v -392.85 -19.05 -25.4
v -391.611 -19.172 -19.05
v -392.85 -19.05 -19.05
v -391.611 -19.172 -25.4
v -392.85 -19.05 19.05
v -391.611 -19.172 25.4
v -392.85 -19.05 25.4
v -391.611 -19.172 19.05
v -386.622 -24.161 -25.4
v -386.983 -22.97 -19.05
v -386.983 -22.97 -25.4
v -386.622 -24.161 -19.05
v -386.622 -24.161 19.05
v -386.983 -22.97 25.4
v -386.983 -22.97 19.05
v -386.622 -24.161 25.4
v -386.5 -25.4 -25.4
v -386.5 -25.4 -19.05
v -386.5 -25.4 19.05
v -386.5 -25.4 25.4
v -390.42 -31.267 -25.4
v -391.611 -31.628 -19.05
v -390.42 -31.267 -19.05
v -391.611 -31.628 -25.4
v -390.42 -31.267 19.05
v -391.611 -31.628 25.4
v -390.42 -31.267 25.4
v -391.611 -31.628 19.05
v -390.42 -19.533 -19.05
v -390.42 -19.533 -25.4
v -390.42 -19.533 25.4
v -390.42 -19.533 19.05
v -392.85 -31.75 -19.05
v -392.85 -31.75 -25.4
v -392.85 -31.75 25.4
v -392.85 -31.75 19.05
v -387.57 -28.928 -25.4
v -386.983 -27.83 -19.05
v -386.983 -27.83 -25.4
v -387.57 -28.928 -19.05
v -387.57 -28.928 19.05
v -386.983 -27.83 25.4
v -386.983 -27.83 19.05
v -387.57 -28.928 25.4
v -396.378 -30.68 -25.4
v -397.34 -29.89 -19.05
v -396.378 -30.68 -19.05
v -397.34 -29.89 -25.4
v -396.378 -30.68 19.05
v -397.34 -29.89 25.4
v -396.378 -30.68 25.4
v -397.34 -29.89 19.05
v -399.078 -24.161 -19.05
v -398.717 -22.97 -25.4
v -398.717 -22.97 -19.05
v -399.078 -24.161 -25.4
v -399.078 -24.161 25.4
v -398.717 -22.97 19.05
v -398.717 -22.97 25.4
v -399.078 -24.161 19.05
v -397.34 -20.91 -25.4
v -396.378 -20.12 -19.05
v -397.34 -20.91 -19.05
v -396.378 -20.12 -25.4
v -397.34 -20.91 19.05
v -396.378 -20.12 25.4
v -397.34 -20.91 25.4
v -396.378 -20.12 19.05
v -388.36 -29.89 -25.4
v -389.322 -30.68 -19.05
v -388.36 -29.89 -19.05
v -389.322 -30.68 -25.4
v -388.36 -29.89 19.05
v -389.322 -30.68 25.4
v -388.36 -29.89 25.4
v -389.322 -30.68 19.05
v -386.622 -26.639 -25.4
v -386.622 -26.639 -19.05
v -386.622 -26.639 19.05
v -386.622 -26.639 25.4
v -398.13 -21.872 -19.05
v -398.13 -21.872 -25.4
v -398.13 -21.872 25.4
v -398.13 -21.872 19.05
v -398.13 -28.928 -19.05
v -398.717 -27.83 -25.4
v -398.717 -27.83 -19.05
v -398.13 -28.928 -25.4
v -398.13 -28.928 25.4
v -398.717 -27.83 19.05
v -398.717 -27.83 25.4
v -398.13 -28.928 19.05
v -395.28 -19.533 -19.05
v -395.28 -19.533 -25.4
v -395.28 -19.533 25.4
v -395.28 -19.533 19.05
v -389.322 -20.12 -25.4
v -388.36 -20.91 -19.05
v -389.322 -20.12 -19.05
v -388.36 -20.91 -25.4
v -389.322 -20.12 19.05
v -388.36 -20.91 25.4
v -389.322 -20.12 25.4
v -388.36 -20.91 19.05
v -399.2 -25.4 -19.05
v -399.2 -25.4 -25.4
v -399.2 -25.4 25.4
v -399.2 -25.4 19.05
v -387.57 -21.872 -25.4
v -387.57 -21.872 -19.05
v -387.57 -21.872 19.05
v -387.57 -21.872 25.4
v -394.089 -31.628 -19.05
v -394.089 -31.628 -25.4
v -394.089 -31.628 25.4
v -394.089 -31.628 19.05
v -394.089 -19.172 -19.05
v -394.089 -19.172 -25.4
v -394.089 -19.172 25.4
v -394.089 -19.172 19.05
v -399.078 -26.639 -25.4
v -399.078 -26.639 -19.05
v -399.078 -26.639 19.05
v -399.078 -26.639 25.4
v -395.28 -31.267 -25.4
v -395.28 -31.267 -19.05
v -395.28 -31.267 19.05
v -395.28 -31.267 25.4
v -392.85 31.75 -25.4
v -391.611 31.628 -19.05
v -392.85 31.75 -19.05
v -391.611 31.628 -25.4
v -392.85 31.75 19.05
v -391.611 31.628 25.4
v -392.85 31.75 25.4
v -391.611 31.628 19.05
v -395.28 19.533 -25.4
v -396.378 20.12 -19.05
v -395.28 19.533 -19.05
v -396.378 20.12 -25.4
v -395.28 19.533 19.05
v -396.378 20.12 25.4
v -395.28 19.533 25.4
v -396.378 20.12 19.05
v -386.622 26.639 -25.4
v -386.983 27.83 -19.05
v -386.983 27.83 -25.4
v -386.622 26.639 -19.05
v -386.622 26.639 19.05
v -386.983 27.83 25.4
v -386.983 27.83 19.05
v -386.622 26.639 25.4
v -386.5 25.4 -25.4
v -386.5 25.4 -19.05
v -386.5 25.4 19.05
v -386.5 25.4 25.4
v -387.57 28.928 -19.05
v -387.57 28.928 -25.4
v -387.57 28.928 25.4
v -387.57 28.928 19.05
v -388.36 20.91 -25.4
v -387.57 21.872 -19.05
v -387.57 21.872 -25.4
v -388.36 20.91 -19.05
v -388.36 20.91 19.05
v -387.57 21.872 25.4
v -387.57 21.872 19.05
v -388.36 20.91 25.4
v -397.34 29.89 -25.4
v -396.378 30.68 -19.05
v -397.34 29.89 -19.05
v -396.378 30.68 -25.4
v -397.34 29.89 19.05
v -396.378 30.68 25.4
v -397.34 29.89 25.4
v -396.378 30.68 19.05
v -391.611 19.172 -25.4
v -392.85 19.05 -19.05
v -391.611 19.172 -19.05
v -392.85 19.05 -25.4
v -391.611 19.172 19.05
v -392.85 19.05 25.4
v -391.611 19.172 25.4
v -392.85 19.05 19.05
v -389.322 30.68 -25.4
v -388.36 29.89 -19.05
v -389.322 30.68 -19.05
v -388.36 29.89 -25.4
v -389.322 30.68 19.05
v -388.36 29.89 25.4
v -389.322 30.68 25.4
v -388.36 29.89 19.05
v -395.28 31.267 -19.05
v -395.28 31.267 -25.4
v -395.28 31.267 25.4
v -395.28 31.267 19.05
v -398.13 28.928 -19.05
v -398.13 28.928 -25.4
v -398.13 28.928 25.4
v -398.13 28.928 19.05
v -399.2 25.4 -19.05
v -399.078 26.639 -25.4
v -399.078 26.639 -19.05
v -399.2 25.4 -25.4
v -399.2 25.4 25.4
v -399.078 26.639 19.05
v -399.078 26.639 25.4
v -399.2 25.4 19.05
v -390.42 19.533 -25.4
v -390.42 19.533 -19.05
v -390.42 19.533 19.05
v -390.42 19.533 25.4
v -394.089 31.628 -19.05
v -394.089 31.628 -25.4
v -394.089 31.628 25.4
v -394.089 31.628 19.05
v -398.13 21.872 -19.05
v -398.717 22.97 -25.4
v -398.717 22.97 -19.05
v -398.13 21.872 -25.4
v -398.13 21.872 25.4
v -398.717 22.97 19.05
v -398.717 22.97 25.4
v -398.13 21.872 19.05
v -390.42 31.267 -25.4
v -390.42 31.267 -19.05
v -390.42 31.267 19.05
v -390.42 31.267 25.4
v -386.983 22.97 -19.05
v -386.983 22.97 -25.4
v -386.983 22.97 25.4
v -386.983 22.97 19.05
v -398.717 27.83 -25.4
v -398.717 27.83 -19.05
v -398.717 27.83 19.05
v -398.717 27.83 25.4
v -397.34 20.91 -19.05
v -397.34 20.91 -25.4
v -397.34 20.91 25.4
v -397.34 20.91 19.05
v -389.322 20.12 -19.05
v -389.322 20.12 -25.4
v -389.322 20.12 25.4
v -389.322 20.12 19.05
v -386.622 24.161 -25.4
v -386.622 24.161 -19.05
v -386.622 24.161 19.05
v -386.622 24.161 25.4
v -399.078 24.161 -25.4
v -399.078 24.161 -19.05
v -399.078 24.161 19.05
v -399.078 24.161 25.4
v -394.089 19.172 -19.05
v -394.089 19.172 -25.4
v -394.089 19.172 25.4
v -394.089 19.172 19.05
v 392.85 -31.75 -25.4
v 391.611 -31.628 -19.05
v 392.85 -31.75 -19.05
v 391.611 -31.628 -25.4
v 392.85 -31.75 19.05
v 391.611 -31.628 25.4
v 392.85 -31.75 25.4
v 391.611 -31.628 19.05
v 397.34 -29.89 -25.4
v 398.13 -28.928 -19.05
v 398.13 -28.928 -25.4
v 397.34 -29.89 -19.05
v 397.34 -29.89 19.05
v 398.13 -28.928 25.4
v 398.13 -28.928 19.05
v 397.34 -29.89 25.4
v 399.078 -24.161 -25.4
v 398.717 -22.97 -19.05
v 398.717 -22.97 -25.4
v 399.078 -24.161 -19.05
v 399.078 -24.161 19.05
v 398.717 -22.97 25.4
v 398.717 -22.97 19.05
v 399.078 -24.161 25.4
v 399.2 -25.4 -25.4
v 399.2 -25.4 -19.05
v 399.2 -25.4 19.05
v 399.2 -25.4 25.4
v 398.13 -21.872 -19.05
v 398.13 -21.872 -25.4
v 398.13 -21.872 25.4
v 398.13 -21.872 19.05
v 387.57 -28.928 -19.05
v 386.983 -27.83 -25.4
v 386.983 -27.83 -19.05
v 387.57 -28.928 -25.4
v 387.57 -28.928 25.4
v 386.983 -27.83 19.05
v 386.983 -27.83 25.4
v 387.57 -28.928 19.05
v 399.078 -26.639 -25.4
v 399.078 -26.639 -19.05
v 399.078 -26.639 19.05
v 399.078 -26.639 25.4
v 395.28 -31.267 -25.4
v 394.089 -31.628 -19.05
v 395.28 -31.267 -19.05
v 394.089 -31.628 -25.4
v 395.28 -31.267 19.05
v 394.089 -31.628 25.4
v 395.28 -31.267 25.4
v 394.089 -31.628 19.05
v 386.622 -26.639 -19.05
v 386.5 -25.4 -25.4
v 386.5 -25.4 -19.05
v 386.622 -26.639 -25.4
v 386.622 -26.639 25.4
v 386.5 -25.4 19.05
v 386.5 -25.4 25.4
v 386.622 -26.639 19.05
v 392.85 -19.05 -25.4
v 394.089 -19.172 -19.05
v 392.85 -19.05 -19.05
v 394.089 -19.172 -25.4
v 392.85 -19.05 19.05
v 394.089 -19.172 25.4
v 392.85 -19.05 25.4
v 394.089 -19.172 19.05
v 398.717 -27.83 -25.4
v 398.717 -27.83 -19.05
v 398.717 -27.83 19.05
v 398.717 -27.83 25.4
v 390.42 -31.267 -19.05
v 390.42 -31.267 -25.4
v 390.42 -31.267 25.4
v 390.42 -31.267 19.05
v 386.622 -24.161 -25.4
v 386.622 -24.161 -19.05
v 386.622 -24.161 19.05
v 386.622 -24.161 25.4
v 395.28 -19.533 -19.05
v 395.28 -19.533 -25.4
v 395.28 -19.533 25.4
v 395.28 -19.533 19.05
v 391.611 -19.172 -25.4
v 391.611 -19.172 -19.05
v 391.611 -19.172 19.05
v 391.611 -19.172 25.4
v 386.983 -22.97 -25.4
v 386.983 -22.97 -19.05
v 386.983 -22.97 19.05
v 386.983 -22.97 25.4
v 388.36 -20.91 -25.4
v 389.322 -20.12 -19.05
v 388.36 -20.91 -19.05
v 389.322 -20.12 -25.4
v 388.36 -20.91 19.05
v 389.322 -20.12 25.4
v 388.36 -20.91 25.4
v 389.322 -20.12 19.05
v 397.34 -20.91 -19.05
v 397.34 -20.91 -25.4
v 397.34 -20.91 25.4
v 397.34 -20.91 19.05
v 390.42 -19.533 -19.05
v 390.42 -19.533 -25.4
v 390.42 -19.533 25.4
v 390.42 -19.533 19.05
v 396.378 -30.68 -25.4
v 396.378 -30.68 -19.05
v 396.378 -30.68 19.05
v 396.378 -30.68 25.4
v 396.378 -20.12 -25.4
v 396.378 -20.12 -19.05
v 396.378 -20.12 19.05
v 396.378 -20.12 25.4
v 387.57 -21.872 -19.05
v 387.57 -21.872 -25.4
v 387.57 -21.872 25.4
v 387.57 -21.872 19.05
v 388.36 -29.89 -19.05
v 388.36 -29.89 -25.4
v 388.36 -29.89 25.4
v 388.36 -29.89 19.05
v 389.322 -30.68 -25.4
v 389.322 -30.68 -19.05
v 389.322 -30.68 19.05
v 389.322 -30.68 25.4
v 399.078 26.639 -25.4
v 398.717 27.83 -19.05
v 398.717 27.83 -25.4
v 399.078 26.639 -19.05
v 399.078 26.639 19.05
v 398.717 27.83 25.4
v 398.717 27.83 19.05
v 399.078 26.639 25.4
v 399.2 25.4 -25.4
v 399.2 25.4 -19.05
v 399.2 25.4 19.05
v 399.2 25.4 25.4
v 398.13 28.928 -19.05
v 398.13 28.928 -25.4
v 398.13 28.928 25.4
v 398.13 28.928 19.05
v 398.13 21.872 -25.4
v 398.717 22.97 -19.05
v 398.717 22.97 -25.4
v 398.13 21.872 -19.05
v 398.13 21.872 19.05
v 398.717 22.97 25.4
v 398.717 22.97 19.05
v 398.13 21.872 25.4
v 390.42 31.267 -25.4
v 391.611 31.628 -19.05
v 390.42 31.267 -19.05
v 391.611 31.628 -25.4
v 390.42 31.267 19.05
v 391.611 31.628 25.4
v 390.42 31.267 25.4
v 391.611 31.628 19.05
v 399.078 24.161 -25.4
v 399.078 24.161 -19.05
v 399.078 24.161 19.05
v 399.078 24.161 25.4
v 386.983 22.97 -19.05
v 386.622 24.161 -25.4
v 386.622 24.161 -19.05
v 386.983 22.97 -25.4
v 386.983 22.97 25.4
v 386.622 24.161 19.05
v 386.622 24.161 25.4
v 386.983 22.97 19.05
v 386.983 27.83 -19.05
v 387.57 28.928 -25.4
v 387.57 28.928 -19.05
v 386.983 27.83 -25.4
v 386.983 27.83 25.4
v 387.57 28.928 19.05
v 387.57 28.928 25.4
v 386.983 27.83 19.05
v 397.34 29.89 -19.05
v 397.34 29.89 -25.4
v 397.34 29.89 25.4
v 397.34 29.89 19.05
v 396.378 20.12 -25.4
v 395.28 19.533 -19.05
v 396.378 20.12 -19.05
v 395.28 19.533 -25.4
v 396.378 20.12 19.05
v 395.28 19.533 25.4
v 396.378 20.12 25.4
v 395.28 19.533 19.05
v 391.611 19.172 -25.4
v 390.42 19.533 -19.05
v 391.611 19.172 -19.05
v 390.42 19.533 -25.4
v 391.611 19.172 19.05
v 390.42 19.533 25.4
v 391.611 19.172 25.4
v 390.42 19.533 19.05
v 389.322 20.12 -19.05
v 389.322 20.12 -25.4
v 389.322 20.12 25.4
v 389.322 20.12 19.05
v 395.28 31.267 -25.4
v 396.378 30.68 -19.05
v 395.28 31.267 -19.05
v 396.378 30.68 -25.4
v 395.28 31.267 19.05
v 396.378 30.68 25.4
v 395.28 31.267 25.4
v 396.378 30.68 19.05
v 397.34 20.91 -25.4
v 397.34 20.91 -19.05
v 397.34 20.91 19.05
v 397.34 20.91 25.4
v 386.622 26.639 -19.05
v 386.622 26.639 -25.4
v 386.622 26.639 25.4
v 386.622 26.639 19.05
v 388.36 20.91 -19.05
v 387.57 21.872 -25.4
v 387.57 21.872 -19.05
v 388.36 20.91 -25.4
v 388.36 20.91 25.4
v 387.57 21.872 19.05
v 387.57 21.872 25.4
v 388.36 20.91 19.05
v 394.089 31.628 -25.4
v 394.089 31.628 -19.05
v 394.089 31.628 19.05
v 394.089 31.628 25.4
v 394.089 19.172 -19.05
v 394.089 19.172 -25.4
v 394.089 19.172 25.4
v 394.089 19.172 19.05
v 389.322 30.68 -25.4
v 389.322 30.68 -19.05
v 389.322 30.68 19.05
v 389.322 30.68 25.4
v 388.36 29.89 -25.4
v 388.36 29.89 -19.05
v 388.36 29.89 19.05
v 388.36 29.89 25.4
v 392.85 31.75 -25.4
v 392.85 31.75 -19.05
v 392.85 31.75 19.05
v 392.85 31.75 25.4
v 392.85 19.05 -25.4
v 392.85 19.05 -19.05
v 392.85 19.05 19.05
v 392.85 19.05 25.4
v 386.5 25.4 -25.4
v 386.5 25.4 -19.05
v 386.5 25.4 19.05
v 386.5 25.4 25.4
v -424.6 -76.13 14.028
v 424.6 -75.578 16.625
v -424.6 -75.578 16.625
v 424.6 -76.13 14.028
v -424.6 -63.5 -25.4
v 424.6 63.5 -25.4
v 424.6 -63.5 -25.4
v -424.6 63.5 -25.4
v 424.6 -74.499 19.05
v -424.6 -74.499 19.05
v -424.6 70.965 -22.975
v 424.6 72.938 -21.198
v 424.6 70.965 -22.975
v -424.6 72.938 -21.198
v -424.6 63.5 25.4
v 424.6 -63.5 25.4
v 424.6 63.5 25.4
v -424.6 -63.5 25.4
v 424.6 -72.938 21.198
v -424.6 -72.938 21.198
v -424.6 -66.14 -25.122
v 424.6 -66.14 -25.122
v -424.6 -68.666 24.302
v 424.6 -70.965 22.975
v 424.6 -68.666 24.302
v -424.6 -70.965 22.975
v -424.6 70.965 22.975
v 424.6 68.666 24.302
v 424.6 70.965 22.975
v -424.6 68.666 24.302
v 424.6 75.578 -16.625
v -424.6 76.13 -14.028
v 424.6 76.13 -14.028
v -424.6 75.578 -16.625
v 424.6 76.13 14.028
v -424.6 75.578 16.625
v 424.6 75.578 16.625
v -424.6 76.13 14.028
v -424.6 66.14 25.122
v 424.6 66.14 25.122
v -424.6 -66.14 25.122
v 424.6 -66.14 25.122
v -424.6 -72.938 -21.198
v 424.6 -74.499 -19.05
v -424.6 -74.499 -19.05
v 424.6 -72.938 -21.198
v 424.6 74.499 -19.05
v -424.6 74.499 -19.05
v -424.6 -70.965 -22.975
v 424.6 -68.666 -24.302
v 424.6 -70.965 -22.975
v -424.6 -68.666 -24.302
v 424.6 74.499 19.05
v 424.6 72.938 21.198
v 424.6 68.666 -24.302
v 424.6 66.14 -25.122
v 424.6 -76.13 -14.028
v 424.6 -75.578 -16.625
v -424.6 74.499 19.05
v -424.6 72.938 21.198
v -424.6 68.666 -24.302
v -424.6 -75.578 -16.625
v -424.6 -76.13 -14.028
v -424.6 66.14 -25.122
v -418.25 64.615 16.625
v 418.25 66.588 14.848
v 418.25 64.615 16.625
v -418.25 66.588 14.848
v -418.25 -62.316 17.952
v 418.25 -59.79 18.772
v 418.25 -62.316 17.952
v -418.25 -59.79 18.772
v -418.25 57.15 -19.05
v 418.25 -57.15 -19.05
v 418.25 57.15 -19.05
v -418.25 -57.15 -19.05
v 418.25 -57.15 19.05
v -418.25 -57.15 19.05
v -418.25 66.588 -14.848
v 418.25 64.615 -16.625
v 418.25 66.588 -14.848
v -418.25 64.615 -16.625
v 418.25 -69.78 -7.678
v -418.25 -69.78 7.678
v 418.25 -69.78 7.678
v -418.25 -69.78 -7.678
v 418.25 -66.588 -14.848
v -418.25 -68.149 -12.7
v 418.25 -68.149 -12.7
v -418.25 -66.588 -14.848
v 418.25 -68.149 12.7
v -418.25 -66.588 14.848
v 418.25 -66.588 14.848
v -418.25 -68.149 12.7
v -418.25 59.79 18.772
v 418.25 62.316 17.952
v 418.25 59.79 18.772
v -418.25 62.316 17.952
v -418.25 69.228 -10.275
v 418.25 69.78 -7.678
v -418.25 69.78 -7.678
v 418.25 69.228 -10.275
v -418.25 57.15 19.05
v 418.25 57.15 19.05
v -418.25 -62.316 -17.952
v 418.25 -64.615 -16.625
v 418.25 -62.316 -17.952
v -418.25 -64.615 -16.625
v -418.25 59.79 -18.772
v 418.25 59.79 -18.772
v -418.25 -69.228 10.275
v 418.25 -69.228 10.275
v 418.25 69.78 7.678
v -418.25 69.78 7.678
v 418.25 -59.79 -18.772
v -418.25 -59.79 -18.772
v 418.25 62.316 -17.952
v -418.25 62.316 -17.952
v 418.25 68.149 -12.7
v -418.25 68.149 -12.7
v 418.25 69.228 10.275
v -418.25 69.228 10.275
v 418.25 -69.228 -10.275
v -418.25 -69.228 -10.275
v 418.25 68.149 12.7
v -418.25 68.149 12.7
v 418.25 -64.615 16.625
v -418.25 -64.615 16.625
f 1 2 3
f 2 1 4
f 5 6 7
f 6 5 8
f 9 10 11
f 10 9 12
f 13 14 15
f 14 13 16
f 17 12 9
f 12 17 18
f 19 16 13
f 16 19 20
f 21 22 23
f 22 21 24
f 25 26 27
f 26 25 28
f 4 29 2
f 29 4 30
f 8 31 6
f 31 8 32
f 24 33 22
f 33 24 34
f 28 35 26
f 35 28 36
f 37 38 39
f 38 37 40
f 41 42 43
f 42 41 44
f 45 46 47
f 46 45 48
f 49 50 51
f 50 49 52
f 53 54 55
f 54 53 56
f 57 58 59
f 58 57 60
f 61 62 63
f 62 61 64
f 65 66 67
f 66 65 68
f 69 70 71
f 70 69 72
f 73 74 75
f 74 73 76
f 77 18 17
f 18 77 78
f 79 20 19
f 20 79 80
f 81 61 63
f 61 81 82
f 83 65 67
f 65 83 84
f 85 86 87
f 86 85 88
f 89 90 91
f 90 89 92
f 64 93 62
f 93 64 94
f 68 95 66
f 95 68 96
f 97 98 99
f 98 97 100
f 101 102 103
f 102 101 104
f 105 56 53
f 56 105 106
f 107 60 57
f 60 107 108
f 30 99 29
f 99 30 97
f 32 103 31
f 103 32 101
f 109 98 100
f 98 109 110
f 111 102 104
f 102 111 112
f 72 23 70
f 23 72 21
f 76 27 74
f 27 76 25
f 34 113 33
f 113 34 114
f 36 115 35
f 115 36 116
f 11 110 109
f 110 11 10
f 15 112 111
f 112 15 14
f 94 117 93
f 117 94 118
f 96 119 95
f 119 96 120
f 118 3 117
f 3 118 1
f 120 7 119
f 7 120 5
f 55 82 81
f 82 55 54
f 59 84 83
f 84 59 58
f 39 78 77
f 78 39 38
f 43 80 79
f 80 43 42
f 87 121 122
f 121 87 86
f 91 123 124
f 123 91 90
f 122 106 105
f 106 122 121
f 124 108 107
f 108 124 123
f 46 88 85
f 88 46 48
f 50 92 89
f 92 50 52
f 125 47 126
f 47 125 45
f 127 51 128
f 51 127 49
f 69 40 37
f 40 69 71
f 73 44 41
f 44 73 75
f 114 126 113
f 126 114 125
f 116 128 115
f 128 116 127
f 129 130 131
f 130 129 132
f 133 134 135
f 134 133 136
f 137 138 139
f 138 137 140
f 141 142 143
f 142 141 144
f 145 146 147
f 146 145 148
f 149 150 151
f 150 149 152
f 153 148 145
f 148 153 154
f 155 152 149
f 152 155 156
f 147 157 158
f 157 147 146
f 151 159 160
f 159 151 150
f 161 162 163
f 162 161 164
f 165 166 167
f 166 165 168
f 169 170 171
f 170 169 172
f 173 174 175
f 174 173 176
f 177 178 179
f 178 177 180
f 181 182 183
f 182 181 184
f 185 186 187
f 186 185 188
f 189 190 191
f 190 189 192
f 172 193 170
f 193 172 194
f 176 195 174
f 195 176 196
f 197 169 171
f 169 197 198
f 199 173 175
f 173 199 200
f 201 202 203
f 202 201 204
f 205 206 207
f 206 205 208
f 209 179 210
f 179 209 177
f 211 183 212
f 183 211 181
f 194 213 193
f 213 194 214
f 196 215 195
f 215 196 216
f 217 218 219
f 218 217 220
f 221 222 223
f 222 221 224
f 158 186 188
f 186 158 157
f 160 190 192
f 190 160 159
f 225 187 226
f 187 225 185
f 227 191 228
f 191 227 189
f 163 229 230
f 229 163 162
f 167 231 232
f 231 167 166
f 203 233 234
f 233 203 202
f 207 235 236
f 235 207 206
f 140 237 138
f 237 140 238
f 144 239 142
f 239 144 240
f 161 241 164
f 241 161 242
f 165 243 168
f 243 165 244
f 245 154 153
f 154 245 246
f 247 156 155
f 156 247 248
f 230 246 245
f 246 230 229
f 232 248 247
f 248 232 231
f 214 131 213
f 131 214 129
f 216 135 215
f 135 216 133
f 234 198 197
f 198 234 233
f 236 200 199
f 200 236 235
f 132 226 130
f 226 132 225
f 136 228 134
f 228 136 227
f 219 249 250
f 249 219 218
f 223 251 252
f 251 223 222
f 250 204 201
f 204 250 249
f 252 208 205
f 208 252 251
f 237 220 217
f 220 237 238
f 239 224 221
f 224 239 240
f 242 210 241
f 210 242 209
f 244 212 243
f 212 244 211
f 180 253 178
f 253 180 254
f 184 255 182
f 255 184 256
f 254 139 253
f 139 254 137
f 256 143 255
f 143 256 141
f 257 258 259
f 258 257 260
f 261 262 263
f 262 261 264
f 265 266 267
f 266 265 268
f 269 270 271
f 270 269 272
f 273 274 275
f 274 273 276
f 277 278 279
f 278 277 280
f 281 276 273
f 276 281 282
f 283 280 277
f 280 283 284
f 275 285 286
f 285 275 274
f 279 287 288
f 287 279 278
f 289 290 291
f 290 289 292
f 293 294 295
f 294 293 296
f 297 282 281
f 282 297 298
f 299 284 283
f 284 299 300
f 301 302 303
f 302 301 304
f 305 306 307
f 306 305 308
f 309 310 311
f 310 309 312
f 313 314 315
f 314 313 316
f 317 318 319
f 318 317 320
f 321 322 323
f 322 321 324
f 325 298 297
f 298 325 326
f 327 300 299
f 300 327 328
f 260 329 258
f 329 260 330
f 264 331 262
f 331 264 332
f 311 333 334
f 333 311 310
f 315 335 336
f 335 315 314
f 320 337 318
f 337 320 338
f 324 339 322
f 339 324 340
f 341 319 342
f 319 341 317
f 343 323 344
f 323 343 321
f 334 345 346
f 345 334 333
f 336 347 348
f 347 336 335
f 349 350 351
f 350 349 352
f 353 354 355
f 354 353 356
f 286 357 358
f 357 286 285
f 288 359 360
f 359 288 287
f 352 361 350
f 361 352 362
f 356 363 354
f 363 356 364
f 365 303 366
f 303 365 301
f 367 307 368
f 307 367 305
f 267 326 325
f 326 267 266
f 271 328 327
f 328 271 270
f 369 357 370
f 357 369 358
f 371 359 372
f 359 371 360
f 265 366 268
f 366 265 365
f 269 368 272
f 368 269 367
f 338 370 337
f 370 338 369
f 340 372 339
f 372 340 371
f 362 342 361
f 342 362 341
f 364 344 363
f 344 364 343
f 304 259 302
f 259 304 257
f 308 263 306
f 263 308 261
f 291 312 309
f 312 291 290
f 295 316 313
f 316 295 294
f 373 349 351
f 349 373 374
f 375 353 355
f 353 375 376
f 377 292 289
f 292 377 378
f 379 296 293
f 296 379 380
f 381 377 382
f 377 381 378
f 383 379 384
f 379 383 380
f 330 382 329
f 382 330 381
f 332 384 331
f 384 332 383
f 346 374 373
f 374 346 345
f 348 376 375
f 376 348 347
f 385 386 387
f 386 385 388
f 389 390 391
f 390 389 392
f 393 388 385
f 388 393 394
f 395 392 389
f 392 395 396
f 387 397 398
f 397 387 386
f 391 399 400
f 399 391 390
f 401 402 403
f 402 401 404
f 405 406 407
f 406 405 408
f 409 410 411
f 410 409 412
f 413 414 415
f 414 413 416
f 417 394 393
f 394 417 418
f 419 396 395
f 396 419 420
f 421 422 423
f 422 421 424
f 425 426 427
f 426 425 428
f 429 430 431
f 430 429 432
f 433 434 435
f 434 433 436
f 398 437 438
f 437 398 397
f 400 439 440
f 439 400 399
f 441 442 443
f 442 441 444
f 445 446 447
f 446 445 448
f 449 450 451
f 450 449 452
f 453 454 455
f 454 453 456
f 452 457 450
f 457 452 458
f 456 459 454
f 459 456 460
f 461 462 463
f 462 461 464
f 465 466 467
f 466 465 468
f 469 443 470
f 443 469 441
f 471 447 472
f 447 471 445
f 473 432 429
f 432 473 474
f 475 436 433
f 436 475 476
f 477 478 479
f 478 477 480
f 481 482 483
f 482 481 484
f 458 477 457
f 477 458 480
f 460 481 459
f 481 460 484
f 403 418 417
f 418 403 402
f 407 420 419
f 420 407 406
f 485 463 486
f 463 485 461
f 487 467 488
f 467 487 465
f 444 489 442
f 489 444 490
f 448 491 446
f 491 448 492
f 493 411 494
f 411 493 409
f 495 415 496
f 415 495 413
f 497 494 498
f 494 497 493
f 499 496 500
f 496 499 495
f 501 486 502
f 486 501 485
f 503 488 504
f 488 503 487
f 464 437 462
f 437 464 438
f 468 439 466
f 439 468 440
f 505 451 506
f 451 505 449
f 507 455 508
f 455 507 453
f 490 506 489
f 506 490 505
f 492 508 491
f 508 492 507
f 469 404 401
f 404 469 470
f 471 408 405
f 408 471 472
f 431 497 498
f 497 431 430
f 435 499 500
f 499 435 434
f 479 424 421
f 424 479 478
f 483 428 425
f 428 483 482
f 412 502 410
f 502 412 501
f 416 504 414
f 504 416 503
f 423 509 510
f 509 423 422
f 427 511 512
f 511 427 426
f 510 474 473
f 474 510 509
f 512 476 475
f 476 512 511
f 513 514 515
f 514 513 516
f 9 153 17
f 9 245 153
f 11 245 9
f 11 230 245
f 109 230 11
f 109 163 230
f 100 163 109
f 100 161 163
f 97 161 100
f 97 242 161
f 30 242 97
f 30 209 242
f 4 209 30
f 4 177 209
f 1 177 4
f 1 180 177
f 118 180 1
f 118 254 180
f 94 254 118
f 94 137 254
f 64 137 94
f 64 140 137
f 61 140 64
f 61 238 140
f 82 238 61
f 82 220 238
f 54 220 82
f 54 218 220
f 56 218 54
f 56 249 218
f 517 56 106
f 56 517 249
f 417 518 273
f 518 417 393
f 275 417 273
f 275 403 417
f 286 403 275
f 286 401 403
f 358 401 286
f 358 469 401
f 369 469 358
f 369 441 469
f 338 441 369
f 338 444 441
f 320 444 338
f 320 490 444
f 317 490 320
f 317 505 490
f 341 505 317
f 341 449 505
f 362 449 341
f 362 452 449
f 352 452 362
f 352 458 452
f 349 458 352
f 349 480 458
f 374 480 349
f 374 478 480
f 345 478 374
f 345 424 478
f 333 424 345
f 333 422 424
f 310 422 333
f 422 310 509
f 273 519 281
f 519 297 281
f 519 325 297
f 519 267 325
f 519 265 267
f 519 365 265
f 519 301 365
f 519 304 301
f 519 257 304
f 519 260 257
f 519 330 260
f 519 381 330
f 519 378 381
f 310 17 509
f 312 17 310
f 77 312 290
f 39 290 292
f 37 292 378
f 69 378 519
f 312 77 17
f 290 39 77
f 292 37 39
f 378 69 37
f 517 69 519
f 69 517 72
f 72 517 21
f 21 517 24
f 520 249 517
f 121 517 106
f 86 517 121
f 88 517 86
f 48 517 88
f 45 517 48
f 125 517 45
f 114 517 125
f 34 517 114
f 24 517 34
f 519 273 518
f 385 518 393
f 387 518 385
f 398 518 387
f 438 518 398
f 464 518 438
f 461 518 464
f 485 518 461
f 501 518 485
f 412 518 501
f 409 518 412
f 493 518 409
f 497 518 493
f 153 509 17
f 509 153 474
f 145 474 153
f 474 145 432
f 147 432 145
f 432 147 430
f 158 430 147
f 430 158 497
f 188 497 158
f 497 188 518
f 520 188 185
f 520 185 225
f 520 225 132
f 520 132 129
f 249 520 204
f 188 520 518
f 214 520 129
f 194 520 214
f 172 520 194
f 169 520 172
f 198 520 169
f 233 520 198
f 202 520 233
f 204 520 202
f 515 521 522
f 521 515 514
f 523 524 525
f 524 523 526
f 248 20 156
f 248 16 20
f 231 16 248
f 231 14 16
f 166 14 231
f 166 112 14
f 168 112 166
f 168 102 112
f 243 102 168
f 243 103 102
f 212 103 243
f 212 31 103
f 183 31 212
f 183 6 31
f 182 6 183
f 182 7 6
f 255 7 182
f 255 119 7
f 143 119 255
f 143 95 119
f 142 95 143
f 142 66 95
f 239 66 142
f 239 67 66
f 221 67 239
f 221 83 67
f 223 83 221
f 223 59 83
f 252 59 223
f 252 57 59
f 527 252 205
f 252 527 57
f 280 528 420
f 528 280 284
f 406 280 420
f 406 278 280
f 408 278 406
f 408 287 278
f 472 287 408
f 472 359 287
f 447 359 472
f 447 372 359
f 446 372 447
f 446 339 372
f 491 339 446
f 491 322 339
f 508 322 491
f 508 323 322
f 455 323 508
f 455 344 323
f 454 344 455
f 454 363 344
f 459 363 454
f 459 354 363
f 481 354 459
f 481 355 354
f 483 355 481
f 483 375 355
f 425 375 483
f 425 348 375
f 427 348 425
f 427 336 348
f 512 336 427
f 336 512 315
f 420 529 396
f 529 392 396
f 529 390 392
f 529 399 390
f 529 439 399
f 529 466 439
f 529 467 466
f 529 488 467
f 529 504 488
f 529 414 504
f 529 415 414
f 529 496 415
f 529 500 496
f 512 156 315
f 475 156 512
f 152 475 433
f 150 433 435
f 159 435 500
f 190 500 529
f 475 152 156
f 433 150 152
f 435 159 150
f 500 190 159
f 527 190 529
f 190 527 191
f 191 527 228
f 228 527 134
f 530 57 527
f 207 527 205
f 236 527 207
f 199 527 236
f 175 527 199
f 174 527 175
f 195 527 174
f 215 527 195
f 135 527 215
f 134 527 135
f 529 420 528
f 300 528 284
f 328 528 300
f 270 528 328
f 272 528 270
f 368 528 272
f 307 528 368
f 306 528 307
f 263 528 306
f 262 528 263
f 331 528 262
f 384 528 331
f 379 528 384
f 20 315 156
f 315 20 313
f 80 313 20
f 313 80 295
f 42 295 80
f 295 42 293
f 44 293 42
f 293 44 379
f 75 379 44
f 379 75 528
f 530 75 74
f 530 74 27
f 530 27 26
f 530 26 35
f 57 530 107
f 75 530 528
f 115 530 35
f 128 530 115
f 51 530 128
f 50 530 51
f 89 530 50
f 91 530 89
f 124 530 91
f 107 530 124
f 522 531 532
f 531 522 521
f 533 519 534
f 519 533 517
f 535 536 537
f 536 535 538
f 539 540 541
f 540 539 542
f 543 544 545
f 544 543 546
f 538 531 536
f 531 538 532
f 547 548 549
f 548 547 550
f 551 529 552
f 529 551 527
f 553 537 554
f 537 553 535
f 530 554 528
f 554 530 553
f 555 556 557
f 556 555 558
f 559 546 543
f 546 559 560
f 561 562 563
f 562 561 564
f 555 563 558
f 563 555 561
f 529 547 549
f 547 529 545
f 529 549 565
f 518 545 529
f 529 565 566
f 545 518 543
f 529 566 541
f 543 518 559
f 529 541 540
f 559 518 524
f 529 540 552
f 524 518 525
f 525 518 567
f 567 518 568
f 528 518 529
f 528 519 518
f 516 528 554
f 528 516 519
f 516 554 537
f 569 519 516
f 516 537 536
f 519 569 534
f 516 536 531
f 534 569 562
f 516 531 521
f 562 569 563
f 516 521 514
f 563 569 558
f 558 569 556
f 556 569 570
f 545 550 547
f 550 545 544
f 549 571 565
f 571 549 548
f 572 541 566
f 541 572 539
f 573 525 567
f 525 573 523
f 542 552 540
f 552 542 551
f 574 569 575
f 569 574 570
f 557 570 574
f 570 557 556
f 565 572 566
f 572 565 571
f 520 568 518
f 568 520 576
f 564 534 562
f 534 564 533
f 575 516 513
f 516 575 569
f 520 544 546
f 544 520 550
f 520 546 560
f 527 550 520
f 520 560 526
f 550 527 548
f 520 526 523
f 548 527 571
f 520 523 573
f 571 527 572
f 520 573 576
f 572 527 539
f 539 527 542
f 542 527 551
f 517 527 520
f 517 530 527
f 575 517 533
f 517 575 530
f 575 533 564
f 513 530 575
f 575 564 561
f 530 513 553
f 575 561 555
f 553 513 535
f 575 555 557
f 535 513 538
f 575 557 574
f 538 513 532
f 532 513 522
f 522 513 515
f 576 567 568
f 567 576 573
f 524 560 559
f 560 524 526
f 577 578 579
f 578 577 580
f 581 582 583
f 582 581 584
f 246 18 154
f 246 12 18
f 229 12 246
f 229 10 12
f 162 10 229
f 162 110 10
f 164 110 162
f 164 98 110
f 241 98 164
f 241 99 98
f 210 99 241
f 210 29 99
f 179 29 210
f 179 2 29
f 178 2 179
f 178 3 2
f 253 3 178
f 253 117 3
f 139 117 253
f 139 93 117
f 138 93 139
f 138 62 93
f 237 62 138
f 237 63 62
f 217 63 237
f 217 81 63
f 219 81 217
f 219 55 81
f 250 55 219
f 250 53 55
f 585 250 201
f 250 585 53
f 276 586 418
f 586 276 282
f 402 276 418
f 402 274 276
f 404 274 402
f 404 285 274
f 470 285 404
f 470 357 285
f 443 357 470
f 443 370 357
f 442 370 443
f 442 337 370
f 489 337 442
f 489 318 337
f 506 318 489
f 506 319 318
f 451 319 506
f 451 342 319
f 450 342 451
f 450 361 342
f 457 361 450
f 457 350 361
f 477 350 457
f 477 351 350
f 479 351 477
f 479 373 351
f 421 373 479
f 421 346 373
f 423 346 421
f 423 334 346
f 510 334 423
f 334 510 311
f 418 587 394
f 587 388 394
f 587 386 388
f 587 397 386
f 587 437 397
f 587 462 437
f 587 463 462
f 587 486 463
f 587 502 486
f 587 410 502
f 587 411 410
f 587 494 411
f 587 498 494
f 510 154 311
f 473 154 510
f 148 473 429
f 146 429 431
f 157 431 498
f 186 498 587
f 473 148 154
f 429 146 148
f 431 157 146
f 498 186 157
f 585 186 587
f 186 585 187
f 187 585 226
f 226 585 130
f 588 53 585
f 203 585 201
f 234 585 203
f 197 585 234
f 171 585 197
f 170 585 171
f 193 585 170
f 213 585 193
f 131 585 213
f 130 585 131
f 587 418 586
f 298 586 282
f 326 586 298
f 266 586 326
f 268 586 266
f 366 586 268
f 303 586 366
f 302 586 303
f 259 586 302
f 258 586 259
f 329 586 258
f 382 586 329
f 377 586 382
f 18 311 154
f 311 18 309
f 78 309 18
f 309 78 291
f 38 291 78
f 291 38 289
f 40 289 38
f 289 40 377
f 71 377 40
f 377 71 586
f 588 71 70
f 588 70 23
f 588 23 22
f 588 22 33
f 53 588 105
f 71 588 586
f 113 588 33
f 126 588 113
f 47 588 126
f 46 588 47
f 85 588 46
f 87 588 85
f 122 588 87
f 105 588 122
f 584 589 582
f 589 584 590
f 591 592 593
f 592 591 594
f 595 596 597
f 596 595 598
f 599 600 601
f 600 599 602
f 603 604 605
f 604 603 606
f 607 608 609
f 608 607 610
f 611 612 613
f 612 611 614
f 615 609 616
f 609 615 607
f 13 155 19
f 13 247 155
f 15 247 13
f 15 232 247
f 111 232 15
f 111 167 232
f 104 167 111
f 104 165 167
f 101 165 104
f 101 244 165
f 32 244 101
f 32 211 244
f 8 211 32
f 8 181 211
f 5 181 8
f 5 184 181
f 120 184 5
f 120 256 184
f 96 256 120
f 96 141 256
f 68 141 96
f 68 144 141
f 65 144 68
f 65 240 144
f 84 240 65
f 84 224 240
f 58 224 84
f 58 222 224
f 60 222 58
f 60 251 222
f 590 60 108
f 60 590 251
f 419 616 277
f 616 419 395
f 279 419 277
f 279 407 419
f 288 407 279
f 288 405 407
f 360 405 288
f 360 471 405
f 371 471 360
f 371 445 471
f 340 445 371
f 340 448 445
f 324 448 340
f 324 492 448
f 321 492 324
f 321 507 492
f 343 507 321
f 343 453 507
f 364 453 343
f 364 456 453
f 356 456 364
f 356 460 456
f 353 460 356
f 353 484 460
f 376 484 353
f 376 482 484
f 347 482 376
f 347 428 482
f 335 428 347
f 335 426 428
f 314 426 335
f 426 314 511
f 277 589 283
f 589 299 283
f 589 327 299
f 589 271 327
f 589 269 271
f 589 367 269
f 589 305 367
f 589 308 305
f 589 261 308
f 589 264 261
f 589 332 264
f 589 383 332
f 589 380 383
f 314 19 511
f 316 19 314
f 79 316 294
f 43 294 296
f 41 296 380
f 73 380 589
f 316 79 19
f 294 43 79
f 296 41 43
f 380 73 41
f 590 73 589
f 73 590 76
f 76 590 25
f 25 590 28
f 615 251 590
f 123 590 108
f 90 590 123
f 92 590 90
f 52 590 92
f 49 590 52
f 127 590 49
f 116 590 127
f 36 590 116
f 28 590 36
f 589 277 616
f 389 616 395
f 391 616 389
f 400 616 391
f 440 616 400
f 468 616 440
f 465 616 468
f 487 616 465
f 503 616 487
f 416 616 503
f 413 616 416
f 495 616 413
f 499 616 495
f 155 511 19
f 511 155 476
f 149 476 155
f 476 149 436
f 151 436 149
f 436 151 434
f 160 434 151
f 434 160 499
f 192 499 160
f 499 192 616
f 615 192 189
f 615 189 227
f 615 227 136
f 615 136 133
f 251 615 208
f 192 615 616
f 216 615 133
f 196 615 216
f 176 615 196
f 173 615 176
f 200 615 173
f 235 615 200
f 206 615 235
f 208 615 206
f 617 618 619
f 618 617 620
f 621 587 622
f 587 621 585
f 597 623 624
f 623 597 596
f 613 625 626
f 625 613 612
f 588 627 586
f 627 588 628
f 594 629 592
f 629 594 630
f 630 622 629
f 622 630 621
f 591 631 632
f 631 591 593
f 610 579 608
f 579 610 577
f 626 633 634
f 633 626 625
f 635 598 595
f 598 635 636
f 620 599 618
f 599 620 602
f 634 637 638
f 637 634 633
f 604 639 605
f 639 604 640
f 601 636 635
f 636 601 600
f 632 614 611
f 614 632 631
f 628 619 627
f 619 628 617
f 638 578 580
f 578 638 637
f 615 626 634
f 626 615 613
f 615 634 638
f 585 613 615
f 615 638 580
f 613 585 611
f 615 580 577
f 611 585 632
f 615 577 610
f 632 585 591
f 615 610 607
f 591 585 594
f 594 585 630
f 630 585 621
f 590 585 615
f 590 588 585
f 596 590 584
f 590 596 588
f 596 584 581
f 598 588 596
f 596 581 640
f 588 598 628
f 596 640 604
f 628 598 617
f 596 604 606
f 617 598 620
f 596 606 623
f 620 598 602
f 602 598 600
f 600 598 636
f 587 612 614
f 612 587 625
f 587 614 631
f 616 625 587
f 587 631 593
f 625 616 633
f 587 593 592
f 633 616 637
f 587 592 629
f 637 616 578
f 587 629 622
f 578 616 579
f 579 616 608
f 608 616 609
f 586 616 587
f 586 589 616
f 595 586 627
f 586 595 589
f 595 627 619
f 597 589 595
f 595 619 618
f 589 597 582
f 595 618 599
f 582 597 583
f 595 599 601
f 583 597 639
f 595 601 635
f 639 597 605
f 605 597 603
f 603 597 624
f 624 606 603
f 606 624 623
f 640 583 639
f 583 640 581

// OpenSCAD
// Part T3: Arm Crossbeam Tube
// Material: 2"×6"×1/4" Rectangular Tubing (50.8mm × 152.4mm × 6.35mm wall)
// Quantity: 1 piece
// Location: Connects left and right loader arms at elbow position
//
// Length = ARM_SPACING (same as TRACK_WIDTH)
// Mounting holes for angle irons at each end, top and bottom

include <../../lifetrac_v25_params.scad>

// =============================================================================
// PART DIMENSIONS
// =============================================================================

_tube_width = 152.4;  // 6 inches (along arm Y direction)
_tube_height = 50.8;  // 2 inches (Z direction)
_wall_thick = 6.35;   // 1/4 inch wall
_corner_radius = 12.7; // 1/2 inch radius

// Length calculated from params
// Crossbeam extends through inner arm CNC plates
_arm_spacing = is_undef(ARM_SPACING) ? 900 : ARM_SPACING;
_tube_w = is_undef(TUBE_2X6_1_4) ? 50.8 : TUBE_2X6_1_4[0];  // Arm tube width (2")

// Ends flush with inner face of inner arm CNC plates
PART_T3_LENGTH = _arm_spacing - _tube_w;
PART_T3_WIDTH = _tube_width;   // 152.4mm (6")
PART_T3_HEIGHT = _tube_height; // 50.8mm (2")
PART_T3_WALL = _wall_thick;
PART_T3_RADIUS = _corner_radius;

// Mounting hole parameters (for angle iron mounts)
_arm_plate_thick = is_undef(ARM_PLATE_THICKNESS) ? 6.35 : ARM_PLATE_THICKNESS;
_angle_hole_offset = 25.4;  // 1 inch from center of angle leg
_hole_x_offset = _arm_spacing/2 - (25.4 + _arm_plate_thick + _angle_hole_offset);
_hole_y_spacing = 25.4;  // 1 inch from beam center (2 inch total spacing)
_bolt_dia = is_undef(BOLT_DIA_1_2) ? 12.7 : BOLT_DIA_1_2;

// =============================================================================
// MAIN MODULE
// =============================================================================

/**
 * Part T3: Arm Crossbeam Tube
 * Cross tube connecting loader arms at elbow position
 * show_holes: if true, renders mounting holes for visualization
 */
module _part_t3_arm_crossbeam(show_holes=true) {
    length = PART_T3_LENGTH;
    width = PART_T3_WIDTH;
    height = PART_T3_HEIGHT;
    wall = PART_T3_WALL;
    rad = PART_T3_RADIUS;
    
    color("DarkGray")
    difference() {
        // Main tube - centered on X axis
        rotate([0, 90, 0])
        linear_extrude(height=length, center=true)
        hull() {
            translate([-height/2 + rad, -width/2 + rad]) circle(r=rad);
            translate([height/2 - rad, -width/2 + rad]) circle(r=rad);
            translate([height/2 - rad, width/2 - rad]) circle(r=rad);
            translate([-height/2 + rad, width/2 - rad]) circle(r=rad);
        }
        
        // Hollow interior
        rotate([0, 90, 0])
        linear_extrude(height=length - 2*wall, center=true)
        hull() {
            translate([-height/2 + rad + wall, -width/2 + rad + wall]) circle(r=rad);
            translate([height/2 - rad - wall, -width/2 + rad + wall]) circle(r=rad);
            translate([height/2 - rad - wall, width/2 - rad - wall]) circle(r=rad);
            translate([-height/2 + rad + wall, width/2 - rad - wall]) circle(r=rad);
        }
        
        // Mounting Holes for Angle Irons
        // Located at ends of beam, top and bottom
        if (show_holes) {
            for (x_pos = [-_hole_x_offset, _hole_x_offset]) {
                for (y_pos = [-_hole_y_spacing, _hole_y_spacing]) {
                    translate([x_pos, y_pos, 0])
                    cylinder(d=_bolt_dia, h=100, center=true, $fn=32);
                }
            }
        }
    }
}

// =============================================================================
// RENDER
// =============================================================================

_part_t3_arm_crossbeam(show_holes=true);

echo("=== PART T3: Arm Crossbeam Tube ===");
echo("Length:", PART_T3_LENGTH, "mm (", PART_T3_LENGTH/25.4, "in)");
echo("Width (6\" face):", PART_T3_WIDTH, "mm");
echo("Height (2\" face):", PART_T3_HEIGHT, "mm");
echo("Wall thickness:", PART_T3_WALL, "mm");
echo("Mounting holes: 8 total (4 per end, 1/2\" dia)");
echo("Quantity needed: 1 piece");
